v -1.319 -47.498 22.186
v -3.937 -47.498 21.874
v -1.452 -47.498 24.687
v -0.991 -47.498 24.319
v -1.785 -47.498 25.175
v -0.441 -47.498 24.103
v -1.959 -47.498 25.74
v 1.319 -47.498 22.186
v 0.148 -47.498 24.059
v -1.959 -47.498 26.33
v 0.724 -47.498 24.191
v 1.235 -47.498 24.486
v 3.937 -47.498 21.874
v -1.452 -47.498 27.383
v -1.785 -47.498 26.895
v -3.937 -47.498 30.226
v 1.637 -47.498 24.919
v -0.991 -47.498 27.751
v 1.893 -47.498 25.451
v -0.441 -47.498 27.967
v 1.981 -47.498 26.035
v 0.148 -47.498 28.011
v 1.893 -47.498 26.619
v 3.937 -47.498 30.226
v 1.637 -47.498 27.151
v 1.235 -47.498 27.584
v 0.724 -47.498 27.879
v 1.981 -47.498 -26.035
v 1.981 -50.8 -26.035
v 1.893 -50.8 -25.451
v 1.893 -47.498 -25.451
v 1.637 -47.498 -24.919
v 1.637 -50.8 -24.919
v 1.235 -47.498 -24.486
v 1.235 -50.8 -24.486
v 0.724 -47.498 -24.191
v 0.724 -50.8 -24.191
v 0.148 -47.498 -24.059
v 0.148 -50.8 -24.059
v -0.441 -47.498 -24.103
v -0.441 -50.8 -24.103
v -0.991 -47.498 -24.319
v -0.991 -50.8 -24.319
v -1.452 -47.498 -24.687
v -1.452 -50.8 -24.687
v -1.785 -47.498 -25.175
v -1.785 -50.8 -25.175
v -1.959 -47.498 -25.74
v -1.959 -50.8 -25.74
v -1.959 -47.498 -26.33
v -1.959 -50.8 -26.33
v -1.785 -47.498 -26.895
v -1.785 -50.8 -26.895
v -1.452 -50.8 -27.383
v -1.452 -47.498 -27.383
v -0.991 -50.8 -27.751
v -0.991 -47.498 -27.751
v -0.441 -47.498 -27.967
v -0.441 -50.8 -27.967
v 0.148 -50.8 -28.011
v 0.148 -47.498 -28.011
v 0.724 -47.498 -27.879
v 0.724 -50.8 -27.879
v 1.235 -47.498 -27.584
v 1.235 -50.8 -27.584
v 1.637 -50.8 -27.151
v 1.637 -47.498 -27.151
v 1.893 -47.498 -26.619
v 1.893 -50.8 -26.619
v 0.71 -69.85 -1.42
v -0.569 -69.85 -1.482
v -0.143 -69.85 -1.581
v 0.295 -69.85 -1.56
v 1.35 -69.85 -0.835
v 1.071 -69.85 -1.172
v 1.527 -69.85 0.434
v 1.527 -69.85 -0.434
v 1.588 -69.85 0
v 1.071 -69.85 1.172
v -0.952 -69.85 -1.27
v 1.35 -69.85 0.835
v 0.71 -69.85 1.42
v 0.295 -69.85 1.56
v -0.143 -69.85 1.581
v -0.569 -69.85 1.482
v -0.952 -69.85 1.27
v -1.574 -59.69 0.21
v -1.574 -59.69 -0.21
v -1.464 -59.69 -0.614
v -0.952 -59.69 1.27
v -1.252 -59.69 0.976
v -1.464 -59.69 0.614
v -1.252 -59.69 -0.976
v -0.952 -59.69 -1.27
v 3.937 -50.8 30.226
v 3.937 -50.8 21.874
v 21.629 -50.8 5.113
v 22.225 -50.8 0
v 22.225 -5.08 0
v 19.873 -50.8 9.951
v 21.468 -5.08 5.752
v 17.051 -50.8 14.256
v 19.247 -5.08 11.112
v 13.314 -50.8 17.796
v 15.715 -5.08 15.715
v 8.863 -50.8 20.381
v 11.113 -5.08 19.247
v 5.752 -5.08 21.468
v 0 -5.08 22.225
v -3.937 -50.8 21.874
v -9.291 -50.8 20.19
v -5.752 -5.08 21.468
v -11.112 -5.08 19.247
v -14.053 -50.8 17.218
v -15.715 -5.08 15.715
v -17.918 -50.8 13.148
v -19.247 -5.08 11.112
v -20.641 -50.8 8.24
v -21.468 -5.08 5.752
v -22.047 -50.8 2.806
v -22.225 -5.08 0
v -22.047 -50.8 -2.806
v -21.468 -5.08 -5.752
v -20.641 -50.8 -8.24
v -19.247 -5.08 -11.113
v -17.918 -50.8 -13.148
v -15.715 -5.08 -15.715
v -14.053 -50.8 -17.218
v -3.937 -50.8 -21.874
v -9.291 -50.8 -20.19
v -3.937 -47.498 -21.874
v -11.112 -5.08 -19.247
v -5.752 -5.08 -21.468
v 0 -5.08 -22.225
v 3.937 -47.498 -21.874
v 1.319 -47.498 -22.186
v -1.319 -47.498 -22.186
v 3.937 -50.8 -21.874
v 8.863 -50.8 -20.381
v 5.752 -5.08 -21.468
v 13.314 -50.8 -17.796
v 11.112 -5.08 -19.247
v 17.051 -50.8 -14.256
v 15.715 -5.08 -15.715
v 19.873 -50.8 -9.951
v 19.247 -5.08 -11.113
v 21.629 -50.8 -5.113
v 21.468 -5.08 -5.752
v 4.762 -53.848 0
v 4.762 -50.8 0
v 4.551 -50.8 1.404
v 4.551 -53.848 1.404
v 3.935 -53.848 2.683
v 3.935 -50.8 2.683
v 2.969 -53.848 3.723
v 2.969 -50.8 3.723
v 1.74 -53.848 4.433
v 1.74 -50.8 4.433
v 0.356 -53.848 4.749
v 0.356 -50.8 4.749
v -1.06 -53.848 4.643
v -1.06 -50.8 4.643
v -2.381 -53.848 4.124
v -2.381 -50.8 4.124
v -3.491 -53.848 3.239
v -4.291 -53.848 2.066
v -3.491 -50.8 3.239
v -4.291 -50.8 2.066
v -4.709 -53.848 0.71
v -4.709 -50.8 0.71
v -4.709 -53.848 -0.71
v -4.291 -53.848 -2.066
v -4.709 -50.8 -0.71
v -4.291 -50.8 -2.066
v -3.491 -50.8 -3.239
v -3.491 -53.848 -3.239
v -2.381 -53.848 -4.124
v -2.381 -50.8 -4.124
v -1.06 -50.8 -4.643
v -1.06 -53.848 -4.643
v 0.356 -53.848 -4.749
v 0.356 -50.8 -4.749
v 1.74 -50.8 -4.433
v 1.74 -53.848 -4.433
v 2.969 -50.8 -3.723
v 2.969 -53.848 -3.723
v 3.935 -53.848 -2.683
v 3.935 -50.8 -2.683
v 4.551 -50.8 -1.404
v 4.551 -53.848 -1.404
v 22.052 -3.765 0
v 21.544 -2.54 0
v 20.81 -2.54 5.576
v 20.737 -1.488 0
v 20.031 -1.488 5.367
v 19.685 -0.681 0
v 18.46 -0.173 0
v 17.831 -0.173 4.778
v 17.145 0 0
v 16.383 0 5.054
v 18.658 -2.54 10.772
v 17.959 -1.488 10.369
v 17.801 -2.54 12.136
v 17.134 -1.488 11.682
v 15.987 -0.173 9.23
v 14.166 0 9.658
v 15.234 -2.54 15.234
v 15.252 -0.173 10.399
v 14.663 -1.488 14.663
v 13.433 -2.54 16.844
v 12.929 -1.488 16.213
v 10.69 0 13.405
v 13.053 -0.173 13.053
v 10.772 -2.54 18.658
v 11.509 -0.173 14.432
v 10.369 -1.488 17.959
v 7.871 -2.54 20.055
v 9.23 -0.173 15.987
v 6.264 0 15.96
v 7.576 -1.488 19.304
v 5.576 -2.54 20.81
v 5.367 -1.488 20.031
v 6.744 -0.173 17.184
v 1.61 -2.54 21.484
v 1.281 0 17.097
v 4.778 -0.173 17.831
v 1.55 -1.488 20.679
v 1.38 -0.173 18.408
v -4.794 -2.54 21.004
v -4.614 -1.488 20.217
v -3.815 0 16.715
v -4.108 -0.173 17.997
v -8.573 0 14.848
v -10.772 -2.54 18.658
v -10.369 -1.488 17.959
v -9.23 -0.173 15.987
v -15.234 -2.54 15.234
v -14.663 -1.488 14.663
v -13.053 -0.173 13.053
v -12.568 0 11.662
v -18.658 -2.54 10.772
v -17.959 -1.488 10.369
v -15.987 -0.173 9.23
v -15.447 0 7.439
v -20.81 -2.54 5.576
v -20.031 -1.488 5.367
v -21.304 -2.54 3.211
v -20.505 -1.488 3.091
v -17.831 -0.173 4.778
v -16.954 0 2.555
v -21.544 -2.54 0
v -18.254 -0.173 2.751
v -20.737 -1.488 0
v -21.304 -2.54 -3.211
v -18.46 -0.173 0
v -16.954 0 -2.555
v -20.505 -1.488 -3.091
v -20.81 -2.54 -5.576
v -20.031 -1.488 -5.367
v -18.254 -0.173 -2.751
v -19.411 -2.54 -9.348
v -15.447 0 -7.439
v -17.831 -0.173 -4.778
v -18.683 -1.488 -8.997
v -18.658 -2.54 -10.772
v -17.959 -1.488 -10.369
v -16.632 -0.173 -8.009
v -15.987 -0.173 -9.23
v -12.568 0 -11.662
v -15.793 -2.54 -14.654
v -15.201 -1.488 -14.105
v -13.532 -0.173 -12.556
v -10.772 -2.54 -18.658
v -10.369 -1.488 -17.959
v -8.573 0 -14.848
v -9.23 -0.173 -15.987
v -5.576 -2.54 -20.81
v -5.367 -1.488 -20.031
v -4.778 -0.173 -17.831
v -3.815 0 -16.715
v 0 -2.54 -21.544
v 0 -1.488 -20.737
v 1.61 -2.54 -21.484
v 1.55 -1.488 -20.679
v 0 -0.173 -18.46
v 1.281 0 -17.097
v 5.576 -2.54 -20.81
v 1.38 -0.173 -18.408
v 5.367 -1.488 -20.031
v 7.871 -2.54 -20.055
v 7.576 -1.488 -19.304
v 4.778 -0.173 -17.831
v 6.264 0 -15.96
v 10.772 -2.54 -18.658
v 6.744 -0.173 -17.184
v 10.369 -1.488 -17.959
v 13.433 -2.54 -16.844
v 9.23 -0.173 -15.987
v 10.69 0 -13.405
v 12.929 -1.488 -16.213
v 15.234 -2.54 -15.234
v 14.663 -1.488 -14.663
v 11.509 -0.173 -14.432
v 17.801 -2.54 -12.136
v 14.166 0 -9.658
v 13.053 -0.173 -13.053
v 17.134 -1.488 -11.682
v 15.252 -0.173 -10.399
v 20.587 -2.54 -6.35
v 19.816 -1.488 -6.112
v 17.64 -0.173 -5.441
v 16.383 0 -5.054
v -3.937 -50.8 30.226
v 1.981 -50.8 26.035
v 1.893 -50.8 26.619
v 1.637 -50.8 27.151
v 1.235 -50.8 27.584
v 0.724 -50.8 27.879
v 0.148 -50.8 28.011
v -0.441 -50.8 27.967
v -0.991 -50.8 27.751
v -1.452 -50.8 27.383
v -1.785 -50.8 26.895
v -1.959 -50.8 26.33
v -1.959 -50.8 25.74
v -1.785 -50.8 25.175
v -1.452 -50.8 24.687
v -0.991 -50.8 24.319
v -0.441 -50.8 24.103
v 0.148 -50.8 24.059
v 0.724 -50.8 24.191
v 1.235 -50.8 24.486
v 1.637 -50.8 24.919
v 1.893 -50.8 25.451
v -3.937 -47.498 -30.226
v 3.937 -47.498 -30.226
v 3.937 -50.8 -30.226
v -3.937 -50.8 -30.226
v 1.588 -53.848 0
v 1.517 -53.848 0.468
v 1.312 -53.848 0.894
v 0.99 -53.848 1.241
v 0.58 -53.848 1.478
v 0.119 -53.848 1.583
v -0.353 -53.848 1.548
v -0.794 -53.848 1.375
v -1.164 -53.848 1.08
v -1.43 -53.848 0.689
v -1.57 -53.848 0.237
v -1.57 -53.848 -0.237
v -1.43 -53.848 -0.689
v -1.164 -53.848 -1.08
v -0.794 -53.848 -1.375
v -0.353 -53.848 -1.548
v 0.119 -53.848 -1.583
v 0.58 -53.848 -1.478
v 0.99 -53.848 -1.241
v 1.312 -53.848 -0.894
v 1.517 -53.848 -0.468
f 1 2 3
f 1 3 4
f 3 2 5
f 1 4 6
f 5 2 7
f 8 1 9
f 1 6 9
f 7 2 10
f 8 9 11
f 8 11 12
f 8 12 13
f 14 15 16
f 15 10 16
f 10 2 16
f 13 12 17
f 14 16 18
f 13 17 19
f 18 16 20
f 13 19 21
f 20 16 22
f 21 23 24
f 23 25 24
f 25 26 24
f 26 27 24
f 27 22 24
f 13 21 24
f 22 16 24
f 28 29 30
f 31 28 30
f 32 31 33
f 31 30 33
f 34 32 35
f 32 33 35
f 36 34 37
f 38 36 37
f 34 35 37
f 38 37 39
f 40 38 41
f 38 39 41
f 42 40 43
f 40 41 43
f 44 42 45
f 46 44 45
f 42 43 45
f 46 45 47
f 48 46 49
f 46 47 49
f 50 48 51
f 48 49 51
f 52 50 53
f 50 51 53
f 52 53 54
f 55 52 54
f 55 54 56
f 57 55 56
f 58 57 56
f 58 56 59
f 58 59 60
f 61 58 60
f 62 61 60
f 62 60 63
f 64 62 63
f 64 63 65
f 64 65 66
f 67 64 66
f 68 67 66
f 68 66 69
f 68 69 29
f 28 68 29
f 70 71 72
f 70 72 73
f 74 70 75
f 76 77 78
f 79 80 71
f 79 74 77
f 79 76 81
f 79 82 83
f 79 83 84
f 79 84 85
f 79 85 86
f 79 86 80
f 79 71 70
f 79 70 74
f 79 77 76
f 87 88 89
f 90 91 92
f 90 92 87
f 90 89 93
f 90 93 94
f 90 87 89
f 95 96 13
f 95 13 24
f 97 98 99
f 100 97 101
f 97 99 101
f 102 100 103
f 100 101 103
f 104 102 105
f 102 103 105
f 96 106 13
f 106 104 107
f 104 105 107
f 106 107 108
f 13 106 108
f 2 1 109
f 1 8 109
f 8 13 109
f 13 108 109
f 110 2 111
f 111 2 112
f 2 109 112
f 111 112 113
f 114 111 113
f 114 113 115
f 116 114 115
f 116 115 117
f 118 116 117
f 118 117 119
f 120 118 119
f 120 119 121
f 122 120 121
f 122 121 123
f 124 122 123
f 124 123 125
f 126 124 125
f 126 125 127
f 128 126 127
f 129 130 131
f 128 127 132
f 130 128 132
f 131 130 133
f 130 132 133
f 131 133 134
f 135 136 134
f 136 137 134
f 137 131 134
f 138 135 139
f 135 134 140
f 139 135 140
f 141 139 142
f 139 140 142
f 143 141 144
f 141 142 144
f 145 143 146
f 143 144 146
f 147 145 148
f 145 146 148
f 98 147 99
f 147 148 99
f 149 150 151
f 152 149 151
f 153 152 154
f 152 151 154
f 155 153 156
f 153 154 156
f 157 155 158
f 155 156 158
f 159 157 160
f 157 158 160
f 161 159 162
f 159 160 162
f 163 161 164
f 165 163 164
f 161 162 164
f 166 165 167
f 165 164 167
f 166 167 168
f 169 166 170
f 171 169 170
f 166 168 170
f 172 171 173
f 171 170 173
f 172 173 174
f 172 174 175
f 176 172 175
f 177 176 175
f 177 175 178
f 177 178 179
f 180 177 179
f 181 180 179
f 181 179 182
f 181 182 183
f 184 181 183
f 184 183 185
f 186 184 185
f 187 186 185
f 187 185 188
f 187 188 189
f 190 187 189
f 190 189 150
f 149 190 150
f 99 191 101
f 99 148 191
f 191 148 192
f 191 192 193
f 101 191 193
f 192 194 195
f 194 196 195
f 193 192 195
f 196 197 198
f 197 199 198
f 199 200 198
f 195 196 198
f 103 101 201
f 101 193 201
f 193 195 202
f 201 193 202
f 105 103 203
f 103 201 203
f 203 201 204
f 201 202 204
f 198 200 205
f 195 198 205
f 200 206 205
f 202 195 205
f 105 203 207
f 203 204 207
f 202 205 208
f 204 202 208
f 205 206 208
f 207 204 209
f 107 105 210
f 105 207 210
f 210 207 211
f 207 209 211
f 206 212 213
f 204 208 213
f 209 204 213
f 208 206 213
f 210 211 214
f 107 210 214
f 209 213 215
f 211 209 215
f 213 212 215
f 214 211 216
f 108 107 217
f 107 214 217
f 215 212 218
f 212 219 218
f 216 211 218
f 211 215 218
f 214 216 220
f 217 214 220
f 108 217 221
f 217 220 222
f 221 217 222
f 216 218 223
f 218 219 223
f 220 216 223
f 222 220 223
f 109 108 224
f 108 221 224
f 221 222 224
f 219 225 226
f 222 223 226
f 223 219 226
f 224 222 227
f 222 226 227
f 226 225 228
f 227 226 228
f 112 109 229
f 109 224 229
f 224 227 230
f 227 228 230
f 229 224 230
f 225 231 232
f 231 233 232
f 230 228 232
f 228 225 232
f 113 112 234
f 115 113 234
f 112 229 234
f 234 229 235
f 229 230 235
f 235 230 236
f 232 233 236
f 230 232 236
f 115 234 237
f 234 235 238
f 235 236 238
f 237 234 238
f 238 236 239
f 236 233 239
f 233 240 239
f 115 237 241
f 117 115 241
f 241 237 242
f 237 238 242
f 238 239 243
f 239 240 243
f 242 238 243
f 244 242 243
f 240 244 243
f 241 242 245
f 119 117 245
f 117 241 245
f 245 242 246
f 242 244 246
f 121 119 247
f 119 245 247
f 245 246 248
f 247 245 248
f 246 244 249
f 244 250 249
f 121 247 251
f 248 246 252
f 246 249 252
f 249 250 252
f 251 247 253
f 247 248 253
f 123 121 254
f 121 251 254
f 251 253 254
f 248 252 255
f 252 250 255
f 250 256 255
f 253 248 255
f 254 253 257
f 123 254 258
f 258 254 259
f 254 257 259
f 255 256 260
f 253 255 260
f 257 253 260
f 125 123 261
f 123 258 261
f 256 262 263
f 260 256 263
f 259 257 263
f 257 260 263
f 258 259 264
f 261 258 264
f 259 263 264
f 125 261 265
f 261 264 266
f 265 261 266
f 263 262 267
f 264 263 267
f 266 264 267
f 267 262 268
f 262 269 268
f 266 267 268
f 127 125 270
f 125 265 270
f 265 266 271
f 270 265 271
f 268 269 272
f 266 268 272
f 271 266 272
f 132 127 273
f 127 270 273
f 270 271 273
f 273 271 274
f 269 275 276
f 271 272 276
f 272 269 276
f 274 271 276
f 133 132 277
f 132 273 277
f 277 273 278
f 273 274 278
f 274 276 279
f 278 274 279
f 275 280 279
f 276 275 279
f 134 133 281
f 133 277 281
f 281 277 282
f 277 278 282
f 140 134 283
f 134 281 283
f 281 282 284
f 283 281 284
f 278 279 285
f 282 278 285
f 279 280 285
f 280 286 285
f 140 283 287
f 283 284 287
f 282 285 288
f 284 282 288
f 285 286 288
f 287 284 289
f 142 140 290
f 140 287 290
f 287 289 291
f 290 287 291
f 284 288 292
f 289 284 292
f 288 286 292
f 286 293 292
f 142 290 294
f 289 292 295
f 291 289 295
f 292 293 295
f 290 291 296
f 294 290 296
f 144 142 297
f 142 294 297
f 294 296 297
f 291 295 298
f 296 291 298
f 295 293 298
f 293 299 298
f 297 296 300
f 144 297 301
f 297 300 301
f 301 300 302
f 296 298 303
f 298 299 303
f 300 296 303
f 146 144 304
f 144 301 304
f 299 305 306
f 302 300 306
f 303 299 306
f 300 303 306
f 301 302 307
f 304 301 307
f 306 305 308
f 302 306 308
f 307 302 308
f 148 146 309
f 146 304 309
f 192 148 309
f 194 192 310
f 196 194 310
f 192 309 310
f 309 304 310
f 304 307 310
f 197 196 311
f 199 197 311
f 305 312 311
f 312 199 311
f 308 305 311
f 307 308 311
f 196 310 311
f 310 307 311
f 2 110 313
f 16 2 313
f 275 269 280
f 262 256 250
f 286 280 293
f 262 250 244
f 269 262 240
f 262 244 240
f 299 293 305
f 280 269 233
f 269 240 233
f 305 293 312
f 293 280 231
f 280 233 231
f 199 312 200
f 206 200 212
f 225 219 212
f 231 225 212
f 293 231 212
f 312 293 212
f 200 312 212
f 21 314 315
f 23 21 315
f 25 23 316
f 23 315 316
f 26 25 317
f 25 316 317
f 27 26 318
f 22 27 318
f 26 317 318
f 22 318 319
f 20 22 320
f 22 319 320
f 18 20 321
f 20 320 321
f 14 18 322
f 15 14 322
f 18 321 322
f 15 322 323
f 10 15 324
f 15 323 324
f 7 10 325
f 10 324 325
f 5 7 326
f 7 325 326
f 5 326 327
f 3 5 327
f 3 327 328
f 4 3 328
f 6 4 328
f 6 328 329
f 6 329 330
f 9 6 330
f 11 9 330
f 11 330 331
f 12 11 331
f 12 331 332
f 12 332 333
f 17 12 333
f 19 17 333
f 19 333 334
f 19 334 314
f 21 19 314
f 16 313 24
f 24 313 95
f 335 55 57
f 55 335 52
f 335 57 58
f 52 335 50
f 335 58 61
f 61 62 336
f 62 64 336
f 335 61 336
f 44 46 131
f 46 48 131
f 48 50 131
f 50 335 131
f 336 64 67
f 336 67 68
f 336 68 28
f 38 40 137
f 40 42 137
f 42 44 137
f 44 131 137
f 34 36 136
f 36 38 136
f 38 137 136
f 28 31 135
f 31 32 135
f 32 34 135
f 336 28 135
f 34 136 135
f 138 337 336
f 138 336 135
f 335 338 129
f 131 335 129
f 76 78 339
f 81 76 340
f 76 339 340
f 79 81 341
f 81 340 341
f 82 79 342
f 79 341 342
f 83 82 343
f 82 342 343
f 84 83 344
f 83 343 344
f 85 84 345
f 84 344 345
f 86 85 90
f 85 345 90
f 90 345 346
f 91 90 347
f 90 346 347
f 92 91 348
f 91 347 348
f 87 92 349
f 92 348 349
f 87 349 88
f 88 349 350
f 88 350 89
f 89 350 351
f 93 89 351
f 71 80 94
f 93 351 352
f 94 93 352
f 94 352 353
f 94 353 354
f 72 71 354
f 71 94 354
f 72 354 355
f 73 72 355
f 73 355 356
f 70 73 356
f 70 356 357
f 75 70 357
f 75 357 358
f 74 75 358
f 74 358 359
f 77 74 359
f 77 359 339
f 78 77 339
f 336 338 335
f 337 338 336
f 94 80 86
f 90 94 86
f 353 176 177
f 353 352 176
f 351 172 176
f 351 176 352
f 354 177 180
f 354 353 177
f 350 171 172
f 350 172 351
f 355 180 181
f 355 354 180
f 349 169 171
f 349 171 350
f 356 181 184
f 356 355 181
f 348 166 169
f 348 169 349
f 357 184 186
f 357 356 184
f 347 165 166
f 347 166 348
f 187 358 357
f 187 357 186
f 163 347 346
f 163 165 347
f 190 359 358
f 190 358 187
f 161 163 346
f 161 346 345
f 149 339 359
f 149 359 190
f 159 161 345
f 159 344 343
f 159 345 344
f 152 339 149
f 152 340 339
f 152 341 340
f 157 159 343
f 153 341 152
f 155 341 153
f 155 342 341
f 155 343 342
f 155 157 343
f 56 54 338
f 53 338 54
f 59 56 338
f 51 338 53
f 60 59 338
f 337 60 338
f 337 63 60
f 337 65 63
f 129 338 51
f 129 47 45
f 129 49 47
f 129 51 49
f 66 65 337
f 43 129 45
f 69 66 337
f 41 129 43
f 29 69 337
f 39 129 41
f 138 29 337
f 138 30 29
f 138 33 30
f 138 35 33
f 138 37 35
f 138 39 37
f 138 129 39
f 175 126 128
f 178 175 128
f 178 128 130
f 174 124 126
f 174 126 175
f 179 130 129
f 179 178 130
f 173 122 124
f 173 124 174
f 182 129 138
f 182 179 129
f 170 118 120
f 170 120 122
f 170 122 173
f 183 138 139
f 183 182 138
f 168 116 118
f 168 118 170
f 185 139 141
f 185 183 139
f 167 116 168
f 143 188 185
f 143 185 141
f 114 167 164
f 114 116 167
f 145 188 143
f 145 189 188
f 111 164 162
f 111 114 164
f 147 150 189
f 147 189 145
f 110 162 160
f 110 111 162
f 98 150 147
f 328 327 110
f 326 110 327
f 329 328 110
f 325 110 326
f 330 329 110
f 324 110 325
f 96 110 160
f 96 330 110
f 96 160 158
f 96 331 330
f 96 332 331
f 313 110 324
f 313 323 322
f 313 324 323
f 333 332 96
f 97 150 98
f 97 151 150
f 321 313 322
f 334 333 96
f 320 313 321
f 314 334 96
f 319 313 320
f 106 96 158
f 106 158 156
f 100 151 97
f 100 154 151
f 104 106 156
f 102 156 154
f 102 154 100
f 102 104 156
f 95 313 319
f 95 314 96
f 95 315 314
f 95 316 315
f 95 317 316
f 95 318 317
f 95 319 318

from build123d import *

# Parameters (mm, degrees)
F0_R      = 22.225
F1_DEPTH  = 50.8
F2_R      = 4.7625
F3_DEPTH  = 3.048
F4_R      = 1.5875
F5_DEPTH  = 16.002
F7_DEPTH  = 10.16
F8_R      = 5.08
F9_W      = 7.874
F9_H      = 60.452
F10_DEPTH = 3.302
F11_R     = 1.9812
F12_DEPTH = 50.801


with BuildPart() as f1:
    # F0 (on Front) → F1 (new body)
    with BuildSketch(Plane.XZ):
        Circle(F0_R)
    extrude(amount=F1_DEPTH)

    # F2 (on face) → F3 (join)
    with BuildSketch(Plane.XZ.offset(50.8)):
        Circle(F2_R)
    extrude(amount=F3_DEPTH)

    # F4 (on face) → F5 (join)
    with BuildSketch(Plane.XZ.offset(53.848)):
        Circle(F4_R)
    extrude(amount=F5_DEPTH)

    # F6 (on face) → F7 (cut)
    with BuildSketch(Plane.XZ.offset(69.85)):
        with BuildLine():
            Line((-0.9525, -1.27), (-0.9525, 1.27))
            ThreePointArc((-0.9525, 1.27), (-1.5875, 0), (-0.9525, -1.27))
        make_face()
    extrude(amount=-F7_DEPTH, mode=Mode.SUBTRACT)

    # F8
    f8_edges = [f1.edges().sort_by_distance(p)[0] for p in [
        (-22.225, 0, 0),
    ]]
    fillet(f8_edges, radius=F8_R)

    # F9 (on face) → F10 (join)
    with BuildSketch(Plane.XZ.offset(50.8)):
        Rectangle(F9_W, F9_H)
    extrude(amount=-F10_DEPTH)

    # F11 (on face) → F12 (cut, through all)
    with BuildSketch(Plane.XZ.offset(50.8)):
        with Locations((0, 26.035)):
            Circle(F11_R)
        with Locations((0, -26.035)):
            Circle(F11_R)
    extrude(amount=-F12_DEPTH, mode=Mode.SUBTRACT)


solid = f1.part
